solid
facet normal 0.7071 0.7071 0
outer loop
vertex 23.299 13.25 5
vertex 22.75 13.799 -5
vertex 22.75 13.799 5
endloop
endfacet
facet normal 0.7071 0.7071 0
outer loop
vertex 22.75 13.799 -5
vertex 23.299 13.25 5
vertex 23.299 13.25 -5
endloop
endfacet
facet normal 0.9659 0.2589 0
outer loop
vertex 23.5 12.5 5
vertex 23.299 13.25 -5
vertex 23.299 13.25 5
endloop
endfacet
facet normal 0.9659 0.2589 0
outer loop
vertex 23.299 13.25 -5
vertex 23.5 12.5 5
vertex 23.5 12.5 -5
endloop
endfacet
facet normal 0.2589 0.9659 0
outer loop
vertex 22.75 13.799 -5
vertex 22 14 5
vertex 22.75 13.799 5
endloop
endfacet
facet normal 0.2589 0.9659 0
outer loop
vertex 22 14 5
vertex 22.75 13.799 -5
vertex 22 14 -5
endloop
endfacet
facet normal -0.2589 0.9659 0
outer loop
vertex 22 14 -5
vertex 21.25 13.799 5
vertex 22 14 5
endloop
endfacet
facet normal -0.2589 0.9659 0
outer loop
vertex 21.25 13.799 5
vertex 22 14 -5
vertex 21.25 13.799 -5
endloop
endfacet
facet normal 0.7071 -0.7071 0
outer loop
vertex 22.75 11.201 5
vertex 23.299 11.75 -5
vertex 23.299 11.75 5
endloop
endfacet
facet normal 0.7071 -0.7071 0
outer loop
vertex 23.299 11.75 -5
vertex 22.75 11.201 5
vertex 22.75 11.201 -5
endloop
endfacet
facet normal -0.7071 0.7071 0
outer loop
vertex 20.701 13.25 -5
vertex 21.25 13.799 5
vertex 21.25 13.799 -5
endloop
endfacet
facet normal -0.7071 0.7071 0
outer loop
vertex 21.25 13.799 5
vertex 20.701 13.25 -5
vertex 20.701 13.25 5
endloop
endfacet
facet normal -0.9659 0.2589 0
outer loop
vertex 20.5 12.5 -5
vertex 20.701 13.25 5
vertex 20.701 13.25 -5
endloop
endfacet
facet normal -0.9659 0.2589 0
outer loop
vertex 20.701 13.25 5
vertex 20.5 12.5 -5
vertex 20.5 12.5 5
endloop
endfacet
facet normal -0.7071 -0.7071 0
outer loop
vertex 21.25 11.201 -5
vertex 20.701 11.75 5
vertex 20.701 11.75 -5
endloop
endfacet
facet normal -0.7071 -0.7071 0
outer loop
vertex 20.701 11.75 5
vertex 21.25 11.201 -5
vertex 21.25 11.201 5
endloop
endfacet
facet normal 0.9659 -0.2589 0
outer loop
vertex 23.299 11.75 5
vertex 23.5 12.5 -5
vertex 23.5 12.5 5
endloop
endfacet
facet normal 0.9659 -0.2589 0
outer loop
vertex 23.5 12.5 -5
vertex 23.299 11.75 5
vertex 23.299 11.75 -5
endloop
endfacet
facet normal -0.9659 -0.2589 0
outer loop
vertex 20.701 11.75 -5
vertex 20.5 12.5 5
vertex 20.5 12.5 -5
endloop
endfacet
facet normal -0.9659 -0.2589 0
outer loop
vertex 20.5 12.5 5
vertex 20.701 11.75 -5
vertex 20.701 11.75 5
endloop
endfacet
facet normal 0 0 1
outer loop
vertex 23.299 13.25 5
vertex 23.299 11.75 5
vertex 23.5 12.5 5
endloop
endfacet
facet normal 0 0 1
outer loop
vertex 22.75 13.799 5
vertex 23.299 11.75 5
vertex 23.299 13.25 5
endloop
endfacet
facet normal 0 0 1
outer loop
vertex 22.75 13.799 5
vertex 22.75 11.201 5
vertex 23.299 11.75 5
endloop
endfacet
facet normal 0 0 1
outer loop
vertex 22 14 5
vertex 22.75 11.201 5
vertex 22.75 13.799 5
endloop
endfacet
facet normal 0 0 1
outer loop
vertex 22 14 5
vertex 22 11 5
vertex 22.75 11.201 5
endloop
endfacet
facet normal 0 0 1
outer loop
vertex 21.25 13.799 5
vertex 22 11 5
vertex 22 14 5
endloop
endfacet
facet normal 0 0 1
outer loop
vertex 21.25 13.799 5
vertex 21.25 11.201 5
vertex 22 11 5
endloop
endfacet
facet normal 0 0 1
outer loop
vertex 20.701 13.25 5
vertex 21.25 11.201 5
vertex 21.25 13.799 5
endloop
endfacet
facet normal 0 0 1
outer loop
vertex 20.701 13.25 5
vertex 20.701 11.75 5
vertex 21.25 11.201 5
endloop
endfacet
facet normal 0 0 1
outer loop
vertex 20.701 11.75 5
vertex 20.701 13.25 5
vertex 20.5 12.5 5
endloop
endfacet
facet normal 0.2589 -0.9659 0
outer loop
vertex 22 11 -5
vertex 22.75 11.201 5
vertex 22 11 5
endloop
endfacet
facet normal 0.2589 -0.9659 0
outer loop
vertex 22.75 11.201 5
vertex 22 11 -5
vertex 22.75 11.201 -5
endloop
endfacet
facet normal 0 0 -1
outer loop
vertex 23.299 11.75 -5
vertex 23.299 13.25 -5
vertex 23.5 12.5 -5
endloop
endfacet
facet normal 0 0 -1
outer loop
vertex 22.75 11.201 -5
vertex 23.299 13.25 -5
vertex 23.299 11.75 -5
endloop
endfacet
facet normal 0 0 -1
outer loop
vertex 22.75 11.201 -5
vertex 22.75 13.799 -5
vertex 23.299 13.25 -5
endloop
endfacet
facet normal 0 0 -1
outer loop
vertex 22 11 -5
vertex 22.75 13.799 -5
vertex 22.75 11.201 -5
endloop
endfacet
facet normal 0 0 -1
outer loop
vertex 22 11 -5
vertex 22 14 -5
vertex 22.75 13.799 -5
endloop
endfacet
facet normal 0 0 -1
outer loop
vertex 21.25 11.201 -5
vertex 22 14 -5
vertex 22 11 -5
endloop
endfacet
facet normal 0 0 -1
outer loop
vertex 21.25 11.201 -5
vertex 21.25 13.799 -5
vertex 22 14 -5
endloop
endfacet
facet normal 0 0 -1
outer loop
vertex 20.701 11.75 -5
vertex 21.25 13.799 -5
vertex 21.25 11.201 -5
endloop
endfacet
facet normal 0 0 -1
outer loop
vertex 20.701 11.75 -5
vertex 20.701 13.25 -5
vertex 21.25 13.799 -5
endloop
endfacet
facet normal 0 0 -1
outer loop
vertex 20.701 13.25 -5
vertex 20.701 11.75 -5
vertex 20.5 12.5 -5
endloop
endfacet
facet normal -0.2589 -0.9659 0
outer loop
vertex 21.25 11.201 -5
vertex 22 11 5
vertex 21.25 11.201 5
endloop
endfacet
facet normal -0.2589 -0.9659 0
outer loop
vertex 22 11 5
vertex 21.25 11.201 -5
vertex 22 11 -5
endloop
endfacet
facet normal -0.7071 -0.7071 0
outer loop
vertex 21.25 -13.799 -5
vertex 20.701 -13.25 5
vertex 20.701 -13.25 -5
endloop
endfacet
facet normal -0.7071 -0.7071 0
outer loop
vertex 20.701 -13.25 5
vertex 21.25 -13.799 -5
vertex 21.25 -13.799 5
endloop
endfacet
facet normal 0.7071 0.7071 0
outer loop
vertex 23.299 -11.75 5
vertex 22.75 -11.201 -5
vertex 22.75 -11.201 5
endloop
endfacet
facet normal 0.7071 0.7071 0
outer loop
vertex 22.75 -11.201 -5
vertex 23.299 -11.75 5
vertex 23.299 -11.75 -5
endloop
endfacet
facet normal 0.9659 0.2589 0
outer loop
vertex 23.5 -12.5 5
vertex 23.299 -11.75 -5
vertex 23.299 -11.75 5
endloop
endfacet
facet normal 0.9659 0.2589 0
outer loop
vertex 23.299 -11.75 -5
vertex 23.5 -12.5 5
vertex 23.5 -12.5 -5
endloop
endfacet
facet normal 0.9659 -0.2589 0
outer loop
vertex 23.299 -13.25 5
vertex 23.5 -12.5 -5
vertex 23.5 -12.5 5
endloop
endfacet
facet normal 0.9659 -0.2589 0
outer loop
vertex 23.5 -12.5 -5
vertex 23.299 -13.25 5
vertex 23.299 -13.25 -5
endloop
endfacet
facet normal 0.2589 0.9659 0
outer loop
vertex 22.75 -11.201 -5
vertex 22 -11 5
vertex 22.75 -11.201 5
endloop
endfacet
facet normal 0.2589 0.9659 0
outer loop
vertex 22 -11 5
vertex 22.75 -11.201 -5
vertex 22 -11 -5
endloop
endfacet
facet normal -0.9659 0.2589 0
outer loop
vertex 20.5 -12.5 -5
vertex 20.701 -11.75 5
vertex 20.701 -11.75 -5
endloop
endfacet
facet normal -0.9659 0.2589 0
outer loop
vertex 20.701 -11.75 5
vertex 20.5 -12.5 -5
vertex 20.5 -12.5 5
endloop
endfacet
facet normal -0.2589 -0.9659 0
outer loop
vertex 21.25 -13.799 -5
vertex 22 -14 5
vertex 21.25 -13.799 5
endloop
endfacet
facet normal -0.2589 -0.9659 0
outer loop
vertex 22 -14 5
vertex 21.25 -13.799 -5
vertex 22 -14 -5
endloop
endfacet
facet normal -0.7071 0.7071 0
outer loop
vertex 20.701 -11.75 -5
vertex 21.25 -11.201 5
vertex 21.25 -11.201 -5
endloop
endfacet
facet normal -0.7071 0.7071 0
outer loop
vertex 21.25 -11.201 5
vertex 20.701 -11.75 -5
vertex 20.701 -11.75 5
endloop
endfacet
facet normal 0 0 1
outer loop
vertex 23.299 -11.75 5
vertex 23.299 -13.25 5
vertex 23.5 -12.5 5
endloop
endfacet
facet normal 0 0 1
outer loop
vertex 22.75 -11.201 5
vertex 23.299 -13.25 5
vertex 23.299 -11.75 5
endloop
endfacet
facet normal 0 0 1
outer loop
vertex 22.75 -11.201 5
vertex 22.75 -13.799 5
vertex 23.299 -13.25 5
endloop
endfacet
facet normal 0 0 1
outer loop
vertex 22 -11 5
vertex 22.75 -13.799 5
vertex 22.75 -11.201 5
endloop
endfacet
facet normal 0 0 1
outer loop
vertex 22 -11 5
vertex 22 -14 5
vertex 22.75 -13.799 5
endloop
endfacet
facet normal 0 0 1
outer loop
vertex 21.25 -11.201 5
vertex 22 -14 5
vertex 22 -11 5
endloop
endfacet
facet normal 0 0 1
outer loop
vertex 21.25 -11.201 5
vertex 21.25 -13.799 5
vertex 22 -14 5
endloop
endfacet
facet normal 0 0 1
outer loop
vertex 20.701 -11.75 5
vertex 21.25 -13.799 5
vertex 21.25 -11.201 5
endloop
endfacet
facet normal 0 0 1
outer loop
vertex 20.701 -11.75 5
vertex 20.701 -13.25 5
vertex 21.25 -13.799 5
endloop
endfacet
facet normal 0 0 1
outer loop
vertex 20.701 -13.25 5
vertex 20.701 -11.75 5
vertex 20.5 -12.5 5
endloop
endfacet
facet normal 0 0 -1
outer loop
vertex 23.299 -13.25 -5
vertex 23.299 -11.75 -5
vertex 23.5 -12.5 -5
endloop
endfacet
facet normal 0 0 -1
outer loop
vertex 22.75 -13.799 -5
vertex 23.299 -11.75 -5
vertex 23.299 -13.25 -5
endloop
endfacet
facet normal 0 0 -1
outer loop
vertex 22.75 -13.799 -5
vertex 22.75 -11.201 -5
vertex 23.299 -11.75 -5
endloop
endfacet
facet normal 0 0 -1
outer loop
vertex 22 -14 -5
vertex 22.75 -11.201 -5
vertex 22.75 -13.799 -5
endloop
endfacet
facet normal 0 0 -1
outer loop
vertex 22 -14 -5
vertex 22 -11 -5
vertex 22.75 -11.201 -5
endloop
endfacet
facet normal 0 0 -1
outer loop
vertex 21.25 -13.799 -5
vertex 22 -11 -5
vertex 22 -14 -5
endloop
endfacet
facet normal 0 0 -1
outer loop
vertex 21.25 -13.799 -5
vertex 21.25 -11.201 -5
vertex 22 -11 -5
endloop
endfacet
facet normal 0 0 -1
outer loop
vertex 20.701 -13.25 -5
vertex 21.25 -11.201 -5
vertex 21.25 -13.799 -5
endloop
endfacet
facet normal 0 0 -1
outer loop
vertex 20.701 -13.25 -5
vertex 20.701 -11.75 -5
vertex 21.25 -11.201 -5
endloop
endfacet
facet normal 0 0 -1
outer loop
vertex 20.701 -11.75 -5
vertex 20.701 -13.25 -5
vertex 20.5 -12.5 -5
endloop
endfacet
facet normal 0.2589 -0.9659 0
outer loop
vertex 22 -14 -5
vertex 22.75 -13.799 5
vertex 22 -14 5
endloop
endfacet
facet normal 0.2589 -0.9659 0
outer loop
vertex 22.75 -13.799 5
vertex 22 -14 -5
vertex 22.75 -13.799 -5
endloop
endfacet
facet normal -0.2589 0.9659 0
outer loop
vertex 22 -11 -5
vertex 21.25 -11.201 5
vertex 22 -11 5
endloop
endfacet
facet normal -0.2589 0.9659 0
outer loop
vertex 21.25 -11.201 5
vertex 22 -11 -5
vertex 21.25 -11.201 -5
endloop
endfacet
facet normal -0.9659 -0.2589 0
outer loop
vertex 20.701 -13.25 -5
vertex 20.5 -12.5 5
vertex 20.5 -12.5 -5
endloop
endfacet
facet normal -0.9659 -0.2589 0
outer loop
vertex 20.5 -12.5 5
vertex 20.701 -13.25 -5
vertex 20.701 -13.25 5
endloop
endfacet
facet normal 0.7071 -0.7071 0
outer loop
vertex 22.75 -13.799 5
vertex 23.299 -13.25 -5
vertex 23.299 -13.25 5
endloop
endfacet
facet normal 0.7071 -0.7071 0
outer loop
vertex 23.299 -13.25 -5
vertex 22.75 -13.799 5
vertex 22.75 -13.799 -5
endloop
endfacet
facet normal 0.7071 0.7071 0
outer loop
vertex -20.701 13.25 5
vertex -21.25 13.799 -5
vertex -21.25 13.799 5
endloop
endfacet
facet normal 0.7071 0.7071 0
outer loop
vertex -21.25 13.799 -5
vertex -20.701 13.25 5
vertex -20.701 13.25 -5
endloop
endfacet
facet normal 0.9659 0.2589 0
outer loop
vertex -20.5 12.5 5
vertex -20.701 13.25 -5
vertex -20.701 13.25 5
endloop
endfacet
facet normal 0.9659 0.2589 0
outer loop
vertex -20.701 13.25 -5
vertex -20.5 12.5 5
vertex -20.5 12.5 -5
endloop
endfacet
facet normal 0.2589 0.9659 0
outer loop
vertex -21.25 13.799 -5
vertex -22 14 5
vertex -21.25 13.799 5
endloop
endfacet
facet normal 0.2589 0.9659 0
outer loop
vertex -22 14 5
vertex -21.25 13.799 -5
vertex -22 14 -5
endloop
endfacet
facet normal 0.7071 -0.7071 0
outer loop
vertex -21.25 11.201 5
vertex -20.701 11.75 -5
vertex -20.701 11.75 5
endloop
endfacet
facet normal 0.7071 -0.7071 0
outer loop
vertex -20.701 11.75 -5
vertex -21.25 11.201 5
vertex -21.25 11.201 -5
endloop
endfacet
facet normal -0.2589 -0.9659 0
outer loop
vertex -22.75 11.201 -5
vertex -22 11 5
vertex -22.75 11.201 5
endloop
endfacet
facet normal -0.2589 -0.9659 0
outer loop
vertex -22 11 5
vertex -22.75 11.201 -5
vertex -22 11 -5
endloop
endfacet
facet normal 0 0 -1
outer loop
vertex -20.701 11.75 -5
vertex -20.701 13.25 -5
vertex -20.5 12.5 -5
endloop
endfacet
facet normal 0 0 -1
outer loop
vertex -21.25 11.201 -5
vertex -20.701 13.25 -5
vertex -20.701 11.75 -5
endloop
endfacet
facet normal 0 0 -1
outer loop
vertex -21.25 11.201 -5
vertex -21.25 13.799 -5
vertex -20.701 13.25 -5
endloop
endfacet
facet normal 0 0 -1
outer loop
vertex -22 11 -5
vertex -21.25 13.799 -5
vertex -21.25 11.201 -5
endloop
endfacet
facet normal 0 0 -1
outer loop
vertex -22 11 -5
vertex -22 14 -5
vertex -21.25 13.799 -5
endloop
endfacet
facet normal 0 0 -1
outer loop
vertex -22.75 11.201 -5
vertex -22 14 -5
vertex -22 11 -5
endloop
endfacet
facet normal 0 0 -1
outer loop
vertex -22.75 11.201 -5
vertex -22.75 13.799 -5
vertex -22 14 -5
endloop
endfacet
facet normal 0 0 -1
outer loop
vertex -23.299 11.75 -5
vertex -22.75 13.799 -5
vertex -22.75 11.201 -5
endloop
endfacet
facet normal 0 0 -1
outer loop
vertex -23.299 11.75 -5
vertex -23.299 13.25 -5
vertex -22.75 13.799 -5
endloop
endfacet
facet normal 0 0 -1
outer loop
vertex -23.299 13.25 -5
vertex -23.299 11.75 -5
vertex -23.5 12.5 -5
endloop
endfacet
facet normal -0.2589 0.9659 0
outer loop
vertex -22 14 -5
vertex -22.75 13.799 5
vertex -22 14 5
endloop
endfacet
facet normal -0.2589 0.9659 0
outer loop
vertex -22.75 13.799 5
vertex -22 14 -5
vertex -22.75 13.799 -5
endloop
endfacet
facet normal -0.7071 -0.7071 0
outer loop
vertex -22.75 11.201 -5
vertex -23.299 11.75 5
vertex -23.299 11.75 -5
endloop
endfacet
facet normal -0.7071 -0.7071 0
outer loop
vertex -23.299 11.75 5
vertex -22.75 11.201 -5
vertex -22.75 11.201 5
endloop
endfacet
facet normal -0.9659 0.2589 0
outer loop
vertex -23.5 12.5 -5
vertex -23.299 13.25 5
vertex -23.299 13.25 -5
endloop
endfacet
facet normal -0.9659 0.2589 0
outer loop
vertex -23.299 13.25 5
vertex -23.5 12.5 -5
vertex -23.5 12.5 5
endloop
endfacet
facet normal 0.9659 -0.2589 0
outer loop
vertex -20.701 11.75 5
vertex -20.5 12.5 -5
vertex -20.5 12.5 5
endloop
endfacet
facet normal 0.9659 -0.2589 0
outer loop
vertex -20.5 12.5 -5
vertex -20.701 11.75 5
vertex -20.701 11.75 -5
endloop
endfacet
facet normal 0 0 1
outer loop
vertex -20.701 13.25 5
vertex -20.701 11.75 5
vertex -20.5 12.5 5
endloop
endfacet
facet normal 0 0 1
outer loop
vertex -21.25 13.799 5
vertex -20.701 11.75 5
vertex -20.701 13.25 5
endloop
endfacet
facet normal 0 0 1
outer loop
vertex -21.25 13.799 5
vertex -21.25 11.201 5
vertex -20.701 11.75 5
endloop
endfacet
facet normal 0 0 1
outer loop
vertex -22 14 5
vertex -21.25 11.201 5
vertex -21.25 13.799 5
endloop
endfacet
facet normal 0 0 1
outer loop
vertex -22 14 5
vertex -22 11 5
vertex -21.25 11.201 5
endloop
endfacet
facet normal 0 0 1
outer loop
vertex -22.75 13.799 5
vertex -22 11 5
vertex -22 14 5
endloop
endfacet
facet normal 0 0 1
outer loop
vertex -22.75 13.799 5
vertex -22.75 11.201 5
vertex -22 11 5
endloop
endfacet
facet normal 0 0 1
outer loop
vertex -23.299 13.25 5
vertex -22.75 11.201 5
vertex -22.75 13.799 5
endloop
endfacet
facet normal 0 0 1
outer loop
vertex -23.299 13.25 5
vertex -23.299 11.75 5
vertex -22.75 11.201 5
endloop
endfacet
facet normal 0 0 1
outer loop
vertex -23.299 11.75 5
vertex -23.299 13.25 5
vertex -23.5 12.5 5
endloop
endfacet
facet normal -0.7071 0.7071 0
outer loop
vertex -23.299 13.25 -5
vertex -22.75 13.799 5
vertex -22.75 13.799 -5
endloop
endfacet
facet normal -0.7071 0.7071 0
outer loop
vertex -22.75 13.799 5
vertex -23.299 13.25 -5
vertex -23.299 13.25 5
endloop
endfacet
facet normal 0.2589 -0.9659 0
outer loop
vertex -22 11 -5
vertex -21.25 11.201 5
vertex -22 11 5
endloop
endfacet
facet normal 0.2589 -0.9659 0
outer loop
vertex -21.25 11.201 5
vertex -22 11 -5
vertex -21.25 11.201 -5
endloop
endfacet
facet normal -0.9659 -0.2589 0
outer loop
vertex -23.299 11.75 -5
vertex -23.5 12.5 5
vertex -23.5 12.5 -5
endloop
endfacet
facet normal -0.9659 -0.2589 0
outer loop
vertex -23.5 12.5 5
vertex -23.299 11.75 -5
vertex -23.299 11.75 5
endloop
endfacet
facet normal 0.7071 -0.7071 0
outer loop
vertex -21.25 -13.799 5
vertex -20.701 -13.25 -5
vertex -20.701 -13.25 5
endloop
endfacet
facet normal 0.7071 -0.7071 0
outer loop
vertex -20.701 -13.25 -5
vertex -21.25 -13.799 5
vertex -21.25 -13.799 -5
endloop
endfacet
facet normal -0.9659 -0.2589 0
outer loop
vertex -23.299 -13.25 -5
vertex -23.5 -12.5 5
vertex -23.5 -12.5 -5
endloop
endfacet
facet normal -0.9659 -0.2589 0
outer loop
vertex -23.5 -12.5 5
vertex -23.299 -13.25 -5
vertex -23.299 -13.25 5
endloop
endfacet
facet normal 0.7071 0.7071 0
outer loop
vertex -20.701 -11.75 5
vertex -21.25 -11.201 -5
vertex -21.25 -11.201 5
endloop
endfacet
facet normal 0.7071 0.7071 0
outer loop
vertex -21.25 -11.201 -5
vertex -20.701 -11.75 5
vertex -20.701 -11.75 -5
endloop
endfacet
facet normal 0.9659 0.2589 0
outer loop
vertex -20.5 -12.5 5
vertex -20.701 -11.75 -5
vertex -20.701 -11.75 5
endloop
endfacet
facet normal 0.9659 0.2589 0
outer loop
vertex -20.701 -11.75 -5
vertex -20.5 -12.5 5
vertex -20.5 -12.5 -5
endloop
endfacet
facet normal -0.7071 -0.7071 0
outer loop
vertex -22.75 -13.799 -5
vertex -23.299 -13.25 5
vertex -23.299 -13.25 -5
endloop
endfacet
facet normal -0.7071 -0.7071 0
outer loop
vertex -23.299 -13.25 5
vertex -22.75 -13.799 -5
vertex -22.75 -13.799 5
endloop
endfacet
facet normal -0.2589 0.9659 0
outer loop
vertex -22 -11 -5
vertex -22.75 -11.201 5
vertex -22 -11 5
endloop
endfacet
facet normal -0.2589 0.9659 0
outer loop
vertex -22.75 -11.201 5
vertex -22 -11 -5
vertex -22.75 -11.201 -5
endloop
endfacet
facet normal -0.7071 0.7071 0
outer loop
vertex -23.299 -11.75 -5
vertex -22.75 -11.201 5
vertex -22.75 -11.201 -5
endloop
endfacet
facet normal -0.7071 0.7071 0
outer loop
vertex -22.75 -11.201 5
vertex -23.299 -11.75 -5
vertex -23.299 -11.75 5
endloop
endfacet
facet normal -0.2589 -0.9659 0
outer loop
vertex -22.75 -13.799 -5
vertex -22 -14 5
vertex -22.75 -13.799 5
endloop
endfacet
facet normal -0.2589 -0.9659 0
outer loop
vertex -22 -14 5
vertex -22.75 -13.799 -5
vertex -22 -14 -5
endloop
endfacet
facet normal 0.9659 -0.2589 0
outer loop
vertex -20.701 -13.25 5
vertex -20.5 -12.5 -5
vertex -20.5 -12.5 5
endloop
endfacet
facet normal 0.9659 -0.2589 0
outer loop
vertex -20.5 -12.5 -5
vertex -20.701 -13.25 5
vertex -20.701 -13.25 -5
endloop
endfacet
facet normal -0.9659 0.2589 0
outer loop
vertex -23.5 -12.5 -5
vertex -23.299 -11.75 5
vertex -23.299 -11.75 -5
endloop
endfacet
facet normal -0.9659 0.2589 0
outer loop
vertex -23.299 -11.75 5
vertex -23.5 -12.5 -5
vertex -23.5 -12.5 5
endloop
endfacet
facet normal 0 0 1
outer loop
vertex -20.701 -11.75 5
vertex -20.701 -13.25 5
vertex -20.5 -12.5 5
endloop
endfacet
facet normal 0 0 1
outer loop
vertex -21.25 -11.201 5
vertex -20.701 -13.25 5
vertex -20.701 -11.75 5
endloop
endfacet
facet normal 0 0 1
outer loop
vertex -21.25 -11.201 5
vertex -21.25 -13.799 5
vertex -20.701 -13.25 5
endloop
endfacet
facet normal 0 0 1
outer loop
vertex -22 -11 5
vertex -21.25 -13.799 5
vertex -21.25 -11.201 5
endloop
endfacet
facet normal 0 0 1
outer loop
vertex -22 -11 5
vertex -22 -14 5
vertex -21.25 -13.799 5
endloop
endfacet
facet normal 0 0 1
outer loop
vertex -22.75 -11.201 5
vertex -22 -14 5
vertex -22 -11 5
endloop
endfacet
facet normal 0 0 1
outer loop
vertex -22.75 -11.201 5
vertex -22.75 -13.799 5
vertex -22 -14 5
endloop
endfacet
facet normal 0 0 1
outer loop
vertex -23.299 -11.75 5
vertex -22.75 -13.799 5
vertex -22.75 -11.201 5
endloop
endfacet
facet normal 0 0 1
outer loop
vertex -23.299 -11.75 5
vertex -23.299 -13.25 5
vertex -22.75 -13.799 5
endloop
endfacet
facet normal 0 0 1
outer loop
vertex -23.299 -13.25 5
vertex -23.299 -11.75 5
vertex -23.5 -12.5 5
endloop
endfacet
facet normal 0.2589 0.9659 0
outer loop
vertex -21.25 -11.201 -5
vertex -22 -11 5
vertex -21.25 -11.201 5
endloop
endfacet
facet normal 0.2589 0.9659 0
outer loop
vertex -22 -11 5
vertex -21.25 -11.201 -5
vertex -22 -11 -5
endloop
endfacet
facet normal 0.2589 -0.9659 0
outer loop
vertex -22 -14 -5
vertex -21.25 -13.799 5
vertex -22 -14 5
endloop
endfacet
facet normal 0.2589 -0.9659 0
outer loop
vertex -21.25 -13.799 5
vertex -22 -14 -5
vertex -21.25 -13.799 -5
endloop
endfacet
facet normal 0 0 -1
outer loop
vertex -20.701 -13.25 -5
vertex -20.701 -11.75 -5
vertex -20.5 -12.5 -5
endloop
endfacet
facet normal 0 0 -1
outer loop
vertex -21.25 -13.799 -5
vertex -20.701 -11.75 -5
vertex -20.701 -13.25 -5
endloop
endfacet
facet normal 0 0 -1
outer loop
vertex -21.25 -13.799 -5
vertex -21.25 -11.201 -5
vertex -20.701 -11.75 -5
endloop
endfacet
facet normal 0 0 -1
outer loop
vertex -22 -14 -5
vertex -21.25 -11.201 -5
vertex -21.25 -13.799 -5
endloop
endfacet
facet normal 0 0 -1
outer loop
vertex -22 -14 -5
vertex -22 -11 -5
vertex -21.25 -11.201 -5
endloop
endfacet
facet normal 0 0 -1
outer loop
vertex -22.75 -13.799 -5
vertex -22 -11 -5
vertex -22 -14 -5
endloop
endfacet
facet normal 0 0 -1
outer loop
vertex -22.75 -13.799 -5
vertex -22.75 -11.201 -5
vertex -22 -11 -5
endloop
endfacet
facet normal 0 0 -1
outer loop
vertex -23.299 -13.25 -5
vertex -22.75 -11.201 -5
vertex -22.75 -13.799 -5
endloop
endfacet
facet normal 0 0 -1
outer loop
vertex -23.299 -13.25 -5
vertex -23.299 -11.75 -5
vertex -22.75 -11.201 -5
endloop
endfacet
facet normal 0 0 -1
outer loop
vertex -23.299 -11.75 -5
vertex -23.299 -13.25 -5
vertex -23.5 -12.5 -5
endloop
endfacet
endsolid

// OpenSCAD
// file: ../params.scad
thickness=2;

// params for the central cylinder
inner_tube_length=50;
inner_tube_radius=20;

cylinder_radius_margin=0.5;

rear_axis_radius=3;
rear_axis_length=10;
rear_axis_padding=1;
front_axis_padding=1;

// params for holes in the central cylinder
hole_depth=inner_tube_radius-5;
hole_length=inner_tube_length-1;
hole_width=inner_tube_radius*0.7;
bottom_hole_width=inner_tube_radius*0.7;

// shell
shell_plate_width = inner_tube_radius * 1.5 + thickness * 2;
shell_plate_length = inner_tube_length + thickness * 3;
shell_plate_thickness = 3;
shell_plate_wing_height = 10;

// motor
motor_total_length=71.35;
motor_block_length=47.3;
motor_block_side=42.3;
motor_block_flat_diameter=53.6;
motor_block_and_disk_length=49;
motor_disk_diameter=22;
motor_disk_length=motor_block_and_disk_length - motor_block_length;
motor_axis_length=motor_total_length - motor_block_and_disk_length;
motor_axis_diameter=5;
motor_axis_diameter_flat=4.5;
motor_axis_radius=motor_axis_diameter / 2;
motor_axis_radius_flat=motor_axis_diameter_flat - motor_axis_radius;

// motor holder
motor_support_width=50;
motor_support_height=51;
motor_support_length=54;
motor_support_hole_length=33.5;
motor_support_hole_width=4;
motor_support_motor_hole_dist_top=9.5;
motor_support_motor_hole_center_height=motor_support_height-motor_support_motor_hole_dist_top-motor_disk_diameter/2;




reservoirH=30;

// connector male/female
plug_diameter_max=67.3;
plug_diameter_min=62;
plug_holders_diameter=64.3;
plug_holders_width=15;
plug_holders_height=1.5;
plug_guide_diameter=66.85;
plug_guide_width=16;
plug_wall_depth=1.5;
plug_height_male=17;
plug_height_female=14.5;
plug_female_offset = plug_wall_depth + 0.5;
// main file
include <../params.scad>

// for local tests only
shell_bottom_bolts();


module shell_bottom_bolts() {
    radius = 1.5;
    height = 10;

    translate([inner_tube_radius * 1.1, inner_tube_length/4, 0])
    cylinder(height, r = radius, center=true, $fn=12);

    translate([inner_tube_radius * 1.1, -inner_tube_length/4, 0])
    cylinder(height, r = radius, center=true, $fn=12);

    translate([-inner_tube_radius * 1.1, inner_tube_length/4, 0])
    cylinder(height, r = radius, center=true, $fn=12);

    translate([-inner_tube_radius * 1.1, -inner_tube_length/4, 0])
    cylinder(height, r = radius, center=true, $fn=12);

}
